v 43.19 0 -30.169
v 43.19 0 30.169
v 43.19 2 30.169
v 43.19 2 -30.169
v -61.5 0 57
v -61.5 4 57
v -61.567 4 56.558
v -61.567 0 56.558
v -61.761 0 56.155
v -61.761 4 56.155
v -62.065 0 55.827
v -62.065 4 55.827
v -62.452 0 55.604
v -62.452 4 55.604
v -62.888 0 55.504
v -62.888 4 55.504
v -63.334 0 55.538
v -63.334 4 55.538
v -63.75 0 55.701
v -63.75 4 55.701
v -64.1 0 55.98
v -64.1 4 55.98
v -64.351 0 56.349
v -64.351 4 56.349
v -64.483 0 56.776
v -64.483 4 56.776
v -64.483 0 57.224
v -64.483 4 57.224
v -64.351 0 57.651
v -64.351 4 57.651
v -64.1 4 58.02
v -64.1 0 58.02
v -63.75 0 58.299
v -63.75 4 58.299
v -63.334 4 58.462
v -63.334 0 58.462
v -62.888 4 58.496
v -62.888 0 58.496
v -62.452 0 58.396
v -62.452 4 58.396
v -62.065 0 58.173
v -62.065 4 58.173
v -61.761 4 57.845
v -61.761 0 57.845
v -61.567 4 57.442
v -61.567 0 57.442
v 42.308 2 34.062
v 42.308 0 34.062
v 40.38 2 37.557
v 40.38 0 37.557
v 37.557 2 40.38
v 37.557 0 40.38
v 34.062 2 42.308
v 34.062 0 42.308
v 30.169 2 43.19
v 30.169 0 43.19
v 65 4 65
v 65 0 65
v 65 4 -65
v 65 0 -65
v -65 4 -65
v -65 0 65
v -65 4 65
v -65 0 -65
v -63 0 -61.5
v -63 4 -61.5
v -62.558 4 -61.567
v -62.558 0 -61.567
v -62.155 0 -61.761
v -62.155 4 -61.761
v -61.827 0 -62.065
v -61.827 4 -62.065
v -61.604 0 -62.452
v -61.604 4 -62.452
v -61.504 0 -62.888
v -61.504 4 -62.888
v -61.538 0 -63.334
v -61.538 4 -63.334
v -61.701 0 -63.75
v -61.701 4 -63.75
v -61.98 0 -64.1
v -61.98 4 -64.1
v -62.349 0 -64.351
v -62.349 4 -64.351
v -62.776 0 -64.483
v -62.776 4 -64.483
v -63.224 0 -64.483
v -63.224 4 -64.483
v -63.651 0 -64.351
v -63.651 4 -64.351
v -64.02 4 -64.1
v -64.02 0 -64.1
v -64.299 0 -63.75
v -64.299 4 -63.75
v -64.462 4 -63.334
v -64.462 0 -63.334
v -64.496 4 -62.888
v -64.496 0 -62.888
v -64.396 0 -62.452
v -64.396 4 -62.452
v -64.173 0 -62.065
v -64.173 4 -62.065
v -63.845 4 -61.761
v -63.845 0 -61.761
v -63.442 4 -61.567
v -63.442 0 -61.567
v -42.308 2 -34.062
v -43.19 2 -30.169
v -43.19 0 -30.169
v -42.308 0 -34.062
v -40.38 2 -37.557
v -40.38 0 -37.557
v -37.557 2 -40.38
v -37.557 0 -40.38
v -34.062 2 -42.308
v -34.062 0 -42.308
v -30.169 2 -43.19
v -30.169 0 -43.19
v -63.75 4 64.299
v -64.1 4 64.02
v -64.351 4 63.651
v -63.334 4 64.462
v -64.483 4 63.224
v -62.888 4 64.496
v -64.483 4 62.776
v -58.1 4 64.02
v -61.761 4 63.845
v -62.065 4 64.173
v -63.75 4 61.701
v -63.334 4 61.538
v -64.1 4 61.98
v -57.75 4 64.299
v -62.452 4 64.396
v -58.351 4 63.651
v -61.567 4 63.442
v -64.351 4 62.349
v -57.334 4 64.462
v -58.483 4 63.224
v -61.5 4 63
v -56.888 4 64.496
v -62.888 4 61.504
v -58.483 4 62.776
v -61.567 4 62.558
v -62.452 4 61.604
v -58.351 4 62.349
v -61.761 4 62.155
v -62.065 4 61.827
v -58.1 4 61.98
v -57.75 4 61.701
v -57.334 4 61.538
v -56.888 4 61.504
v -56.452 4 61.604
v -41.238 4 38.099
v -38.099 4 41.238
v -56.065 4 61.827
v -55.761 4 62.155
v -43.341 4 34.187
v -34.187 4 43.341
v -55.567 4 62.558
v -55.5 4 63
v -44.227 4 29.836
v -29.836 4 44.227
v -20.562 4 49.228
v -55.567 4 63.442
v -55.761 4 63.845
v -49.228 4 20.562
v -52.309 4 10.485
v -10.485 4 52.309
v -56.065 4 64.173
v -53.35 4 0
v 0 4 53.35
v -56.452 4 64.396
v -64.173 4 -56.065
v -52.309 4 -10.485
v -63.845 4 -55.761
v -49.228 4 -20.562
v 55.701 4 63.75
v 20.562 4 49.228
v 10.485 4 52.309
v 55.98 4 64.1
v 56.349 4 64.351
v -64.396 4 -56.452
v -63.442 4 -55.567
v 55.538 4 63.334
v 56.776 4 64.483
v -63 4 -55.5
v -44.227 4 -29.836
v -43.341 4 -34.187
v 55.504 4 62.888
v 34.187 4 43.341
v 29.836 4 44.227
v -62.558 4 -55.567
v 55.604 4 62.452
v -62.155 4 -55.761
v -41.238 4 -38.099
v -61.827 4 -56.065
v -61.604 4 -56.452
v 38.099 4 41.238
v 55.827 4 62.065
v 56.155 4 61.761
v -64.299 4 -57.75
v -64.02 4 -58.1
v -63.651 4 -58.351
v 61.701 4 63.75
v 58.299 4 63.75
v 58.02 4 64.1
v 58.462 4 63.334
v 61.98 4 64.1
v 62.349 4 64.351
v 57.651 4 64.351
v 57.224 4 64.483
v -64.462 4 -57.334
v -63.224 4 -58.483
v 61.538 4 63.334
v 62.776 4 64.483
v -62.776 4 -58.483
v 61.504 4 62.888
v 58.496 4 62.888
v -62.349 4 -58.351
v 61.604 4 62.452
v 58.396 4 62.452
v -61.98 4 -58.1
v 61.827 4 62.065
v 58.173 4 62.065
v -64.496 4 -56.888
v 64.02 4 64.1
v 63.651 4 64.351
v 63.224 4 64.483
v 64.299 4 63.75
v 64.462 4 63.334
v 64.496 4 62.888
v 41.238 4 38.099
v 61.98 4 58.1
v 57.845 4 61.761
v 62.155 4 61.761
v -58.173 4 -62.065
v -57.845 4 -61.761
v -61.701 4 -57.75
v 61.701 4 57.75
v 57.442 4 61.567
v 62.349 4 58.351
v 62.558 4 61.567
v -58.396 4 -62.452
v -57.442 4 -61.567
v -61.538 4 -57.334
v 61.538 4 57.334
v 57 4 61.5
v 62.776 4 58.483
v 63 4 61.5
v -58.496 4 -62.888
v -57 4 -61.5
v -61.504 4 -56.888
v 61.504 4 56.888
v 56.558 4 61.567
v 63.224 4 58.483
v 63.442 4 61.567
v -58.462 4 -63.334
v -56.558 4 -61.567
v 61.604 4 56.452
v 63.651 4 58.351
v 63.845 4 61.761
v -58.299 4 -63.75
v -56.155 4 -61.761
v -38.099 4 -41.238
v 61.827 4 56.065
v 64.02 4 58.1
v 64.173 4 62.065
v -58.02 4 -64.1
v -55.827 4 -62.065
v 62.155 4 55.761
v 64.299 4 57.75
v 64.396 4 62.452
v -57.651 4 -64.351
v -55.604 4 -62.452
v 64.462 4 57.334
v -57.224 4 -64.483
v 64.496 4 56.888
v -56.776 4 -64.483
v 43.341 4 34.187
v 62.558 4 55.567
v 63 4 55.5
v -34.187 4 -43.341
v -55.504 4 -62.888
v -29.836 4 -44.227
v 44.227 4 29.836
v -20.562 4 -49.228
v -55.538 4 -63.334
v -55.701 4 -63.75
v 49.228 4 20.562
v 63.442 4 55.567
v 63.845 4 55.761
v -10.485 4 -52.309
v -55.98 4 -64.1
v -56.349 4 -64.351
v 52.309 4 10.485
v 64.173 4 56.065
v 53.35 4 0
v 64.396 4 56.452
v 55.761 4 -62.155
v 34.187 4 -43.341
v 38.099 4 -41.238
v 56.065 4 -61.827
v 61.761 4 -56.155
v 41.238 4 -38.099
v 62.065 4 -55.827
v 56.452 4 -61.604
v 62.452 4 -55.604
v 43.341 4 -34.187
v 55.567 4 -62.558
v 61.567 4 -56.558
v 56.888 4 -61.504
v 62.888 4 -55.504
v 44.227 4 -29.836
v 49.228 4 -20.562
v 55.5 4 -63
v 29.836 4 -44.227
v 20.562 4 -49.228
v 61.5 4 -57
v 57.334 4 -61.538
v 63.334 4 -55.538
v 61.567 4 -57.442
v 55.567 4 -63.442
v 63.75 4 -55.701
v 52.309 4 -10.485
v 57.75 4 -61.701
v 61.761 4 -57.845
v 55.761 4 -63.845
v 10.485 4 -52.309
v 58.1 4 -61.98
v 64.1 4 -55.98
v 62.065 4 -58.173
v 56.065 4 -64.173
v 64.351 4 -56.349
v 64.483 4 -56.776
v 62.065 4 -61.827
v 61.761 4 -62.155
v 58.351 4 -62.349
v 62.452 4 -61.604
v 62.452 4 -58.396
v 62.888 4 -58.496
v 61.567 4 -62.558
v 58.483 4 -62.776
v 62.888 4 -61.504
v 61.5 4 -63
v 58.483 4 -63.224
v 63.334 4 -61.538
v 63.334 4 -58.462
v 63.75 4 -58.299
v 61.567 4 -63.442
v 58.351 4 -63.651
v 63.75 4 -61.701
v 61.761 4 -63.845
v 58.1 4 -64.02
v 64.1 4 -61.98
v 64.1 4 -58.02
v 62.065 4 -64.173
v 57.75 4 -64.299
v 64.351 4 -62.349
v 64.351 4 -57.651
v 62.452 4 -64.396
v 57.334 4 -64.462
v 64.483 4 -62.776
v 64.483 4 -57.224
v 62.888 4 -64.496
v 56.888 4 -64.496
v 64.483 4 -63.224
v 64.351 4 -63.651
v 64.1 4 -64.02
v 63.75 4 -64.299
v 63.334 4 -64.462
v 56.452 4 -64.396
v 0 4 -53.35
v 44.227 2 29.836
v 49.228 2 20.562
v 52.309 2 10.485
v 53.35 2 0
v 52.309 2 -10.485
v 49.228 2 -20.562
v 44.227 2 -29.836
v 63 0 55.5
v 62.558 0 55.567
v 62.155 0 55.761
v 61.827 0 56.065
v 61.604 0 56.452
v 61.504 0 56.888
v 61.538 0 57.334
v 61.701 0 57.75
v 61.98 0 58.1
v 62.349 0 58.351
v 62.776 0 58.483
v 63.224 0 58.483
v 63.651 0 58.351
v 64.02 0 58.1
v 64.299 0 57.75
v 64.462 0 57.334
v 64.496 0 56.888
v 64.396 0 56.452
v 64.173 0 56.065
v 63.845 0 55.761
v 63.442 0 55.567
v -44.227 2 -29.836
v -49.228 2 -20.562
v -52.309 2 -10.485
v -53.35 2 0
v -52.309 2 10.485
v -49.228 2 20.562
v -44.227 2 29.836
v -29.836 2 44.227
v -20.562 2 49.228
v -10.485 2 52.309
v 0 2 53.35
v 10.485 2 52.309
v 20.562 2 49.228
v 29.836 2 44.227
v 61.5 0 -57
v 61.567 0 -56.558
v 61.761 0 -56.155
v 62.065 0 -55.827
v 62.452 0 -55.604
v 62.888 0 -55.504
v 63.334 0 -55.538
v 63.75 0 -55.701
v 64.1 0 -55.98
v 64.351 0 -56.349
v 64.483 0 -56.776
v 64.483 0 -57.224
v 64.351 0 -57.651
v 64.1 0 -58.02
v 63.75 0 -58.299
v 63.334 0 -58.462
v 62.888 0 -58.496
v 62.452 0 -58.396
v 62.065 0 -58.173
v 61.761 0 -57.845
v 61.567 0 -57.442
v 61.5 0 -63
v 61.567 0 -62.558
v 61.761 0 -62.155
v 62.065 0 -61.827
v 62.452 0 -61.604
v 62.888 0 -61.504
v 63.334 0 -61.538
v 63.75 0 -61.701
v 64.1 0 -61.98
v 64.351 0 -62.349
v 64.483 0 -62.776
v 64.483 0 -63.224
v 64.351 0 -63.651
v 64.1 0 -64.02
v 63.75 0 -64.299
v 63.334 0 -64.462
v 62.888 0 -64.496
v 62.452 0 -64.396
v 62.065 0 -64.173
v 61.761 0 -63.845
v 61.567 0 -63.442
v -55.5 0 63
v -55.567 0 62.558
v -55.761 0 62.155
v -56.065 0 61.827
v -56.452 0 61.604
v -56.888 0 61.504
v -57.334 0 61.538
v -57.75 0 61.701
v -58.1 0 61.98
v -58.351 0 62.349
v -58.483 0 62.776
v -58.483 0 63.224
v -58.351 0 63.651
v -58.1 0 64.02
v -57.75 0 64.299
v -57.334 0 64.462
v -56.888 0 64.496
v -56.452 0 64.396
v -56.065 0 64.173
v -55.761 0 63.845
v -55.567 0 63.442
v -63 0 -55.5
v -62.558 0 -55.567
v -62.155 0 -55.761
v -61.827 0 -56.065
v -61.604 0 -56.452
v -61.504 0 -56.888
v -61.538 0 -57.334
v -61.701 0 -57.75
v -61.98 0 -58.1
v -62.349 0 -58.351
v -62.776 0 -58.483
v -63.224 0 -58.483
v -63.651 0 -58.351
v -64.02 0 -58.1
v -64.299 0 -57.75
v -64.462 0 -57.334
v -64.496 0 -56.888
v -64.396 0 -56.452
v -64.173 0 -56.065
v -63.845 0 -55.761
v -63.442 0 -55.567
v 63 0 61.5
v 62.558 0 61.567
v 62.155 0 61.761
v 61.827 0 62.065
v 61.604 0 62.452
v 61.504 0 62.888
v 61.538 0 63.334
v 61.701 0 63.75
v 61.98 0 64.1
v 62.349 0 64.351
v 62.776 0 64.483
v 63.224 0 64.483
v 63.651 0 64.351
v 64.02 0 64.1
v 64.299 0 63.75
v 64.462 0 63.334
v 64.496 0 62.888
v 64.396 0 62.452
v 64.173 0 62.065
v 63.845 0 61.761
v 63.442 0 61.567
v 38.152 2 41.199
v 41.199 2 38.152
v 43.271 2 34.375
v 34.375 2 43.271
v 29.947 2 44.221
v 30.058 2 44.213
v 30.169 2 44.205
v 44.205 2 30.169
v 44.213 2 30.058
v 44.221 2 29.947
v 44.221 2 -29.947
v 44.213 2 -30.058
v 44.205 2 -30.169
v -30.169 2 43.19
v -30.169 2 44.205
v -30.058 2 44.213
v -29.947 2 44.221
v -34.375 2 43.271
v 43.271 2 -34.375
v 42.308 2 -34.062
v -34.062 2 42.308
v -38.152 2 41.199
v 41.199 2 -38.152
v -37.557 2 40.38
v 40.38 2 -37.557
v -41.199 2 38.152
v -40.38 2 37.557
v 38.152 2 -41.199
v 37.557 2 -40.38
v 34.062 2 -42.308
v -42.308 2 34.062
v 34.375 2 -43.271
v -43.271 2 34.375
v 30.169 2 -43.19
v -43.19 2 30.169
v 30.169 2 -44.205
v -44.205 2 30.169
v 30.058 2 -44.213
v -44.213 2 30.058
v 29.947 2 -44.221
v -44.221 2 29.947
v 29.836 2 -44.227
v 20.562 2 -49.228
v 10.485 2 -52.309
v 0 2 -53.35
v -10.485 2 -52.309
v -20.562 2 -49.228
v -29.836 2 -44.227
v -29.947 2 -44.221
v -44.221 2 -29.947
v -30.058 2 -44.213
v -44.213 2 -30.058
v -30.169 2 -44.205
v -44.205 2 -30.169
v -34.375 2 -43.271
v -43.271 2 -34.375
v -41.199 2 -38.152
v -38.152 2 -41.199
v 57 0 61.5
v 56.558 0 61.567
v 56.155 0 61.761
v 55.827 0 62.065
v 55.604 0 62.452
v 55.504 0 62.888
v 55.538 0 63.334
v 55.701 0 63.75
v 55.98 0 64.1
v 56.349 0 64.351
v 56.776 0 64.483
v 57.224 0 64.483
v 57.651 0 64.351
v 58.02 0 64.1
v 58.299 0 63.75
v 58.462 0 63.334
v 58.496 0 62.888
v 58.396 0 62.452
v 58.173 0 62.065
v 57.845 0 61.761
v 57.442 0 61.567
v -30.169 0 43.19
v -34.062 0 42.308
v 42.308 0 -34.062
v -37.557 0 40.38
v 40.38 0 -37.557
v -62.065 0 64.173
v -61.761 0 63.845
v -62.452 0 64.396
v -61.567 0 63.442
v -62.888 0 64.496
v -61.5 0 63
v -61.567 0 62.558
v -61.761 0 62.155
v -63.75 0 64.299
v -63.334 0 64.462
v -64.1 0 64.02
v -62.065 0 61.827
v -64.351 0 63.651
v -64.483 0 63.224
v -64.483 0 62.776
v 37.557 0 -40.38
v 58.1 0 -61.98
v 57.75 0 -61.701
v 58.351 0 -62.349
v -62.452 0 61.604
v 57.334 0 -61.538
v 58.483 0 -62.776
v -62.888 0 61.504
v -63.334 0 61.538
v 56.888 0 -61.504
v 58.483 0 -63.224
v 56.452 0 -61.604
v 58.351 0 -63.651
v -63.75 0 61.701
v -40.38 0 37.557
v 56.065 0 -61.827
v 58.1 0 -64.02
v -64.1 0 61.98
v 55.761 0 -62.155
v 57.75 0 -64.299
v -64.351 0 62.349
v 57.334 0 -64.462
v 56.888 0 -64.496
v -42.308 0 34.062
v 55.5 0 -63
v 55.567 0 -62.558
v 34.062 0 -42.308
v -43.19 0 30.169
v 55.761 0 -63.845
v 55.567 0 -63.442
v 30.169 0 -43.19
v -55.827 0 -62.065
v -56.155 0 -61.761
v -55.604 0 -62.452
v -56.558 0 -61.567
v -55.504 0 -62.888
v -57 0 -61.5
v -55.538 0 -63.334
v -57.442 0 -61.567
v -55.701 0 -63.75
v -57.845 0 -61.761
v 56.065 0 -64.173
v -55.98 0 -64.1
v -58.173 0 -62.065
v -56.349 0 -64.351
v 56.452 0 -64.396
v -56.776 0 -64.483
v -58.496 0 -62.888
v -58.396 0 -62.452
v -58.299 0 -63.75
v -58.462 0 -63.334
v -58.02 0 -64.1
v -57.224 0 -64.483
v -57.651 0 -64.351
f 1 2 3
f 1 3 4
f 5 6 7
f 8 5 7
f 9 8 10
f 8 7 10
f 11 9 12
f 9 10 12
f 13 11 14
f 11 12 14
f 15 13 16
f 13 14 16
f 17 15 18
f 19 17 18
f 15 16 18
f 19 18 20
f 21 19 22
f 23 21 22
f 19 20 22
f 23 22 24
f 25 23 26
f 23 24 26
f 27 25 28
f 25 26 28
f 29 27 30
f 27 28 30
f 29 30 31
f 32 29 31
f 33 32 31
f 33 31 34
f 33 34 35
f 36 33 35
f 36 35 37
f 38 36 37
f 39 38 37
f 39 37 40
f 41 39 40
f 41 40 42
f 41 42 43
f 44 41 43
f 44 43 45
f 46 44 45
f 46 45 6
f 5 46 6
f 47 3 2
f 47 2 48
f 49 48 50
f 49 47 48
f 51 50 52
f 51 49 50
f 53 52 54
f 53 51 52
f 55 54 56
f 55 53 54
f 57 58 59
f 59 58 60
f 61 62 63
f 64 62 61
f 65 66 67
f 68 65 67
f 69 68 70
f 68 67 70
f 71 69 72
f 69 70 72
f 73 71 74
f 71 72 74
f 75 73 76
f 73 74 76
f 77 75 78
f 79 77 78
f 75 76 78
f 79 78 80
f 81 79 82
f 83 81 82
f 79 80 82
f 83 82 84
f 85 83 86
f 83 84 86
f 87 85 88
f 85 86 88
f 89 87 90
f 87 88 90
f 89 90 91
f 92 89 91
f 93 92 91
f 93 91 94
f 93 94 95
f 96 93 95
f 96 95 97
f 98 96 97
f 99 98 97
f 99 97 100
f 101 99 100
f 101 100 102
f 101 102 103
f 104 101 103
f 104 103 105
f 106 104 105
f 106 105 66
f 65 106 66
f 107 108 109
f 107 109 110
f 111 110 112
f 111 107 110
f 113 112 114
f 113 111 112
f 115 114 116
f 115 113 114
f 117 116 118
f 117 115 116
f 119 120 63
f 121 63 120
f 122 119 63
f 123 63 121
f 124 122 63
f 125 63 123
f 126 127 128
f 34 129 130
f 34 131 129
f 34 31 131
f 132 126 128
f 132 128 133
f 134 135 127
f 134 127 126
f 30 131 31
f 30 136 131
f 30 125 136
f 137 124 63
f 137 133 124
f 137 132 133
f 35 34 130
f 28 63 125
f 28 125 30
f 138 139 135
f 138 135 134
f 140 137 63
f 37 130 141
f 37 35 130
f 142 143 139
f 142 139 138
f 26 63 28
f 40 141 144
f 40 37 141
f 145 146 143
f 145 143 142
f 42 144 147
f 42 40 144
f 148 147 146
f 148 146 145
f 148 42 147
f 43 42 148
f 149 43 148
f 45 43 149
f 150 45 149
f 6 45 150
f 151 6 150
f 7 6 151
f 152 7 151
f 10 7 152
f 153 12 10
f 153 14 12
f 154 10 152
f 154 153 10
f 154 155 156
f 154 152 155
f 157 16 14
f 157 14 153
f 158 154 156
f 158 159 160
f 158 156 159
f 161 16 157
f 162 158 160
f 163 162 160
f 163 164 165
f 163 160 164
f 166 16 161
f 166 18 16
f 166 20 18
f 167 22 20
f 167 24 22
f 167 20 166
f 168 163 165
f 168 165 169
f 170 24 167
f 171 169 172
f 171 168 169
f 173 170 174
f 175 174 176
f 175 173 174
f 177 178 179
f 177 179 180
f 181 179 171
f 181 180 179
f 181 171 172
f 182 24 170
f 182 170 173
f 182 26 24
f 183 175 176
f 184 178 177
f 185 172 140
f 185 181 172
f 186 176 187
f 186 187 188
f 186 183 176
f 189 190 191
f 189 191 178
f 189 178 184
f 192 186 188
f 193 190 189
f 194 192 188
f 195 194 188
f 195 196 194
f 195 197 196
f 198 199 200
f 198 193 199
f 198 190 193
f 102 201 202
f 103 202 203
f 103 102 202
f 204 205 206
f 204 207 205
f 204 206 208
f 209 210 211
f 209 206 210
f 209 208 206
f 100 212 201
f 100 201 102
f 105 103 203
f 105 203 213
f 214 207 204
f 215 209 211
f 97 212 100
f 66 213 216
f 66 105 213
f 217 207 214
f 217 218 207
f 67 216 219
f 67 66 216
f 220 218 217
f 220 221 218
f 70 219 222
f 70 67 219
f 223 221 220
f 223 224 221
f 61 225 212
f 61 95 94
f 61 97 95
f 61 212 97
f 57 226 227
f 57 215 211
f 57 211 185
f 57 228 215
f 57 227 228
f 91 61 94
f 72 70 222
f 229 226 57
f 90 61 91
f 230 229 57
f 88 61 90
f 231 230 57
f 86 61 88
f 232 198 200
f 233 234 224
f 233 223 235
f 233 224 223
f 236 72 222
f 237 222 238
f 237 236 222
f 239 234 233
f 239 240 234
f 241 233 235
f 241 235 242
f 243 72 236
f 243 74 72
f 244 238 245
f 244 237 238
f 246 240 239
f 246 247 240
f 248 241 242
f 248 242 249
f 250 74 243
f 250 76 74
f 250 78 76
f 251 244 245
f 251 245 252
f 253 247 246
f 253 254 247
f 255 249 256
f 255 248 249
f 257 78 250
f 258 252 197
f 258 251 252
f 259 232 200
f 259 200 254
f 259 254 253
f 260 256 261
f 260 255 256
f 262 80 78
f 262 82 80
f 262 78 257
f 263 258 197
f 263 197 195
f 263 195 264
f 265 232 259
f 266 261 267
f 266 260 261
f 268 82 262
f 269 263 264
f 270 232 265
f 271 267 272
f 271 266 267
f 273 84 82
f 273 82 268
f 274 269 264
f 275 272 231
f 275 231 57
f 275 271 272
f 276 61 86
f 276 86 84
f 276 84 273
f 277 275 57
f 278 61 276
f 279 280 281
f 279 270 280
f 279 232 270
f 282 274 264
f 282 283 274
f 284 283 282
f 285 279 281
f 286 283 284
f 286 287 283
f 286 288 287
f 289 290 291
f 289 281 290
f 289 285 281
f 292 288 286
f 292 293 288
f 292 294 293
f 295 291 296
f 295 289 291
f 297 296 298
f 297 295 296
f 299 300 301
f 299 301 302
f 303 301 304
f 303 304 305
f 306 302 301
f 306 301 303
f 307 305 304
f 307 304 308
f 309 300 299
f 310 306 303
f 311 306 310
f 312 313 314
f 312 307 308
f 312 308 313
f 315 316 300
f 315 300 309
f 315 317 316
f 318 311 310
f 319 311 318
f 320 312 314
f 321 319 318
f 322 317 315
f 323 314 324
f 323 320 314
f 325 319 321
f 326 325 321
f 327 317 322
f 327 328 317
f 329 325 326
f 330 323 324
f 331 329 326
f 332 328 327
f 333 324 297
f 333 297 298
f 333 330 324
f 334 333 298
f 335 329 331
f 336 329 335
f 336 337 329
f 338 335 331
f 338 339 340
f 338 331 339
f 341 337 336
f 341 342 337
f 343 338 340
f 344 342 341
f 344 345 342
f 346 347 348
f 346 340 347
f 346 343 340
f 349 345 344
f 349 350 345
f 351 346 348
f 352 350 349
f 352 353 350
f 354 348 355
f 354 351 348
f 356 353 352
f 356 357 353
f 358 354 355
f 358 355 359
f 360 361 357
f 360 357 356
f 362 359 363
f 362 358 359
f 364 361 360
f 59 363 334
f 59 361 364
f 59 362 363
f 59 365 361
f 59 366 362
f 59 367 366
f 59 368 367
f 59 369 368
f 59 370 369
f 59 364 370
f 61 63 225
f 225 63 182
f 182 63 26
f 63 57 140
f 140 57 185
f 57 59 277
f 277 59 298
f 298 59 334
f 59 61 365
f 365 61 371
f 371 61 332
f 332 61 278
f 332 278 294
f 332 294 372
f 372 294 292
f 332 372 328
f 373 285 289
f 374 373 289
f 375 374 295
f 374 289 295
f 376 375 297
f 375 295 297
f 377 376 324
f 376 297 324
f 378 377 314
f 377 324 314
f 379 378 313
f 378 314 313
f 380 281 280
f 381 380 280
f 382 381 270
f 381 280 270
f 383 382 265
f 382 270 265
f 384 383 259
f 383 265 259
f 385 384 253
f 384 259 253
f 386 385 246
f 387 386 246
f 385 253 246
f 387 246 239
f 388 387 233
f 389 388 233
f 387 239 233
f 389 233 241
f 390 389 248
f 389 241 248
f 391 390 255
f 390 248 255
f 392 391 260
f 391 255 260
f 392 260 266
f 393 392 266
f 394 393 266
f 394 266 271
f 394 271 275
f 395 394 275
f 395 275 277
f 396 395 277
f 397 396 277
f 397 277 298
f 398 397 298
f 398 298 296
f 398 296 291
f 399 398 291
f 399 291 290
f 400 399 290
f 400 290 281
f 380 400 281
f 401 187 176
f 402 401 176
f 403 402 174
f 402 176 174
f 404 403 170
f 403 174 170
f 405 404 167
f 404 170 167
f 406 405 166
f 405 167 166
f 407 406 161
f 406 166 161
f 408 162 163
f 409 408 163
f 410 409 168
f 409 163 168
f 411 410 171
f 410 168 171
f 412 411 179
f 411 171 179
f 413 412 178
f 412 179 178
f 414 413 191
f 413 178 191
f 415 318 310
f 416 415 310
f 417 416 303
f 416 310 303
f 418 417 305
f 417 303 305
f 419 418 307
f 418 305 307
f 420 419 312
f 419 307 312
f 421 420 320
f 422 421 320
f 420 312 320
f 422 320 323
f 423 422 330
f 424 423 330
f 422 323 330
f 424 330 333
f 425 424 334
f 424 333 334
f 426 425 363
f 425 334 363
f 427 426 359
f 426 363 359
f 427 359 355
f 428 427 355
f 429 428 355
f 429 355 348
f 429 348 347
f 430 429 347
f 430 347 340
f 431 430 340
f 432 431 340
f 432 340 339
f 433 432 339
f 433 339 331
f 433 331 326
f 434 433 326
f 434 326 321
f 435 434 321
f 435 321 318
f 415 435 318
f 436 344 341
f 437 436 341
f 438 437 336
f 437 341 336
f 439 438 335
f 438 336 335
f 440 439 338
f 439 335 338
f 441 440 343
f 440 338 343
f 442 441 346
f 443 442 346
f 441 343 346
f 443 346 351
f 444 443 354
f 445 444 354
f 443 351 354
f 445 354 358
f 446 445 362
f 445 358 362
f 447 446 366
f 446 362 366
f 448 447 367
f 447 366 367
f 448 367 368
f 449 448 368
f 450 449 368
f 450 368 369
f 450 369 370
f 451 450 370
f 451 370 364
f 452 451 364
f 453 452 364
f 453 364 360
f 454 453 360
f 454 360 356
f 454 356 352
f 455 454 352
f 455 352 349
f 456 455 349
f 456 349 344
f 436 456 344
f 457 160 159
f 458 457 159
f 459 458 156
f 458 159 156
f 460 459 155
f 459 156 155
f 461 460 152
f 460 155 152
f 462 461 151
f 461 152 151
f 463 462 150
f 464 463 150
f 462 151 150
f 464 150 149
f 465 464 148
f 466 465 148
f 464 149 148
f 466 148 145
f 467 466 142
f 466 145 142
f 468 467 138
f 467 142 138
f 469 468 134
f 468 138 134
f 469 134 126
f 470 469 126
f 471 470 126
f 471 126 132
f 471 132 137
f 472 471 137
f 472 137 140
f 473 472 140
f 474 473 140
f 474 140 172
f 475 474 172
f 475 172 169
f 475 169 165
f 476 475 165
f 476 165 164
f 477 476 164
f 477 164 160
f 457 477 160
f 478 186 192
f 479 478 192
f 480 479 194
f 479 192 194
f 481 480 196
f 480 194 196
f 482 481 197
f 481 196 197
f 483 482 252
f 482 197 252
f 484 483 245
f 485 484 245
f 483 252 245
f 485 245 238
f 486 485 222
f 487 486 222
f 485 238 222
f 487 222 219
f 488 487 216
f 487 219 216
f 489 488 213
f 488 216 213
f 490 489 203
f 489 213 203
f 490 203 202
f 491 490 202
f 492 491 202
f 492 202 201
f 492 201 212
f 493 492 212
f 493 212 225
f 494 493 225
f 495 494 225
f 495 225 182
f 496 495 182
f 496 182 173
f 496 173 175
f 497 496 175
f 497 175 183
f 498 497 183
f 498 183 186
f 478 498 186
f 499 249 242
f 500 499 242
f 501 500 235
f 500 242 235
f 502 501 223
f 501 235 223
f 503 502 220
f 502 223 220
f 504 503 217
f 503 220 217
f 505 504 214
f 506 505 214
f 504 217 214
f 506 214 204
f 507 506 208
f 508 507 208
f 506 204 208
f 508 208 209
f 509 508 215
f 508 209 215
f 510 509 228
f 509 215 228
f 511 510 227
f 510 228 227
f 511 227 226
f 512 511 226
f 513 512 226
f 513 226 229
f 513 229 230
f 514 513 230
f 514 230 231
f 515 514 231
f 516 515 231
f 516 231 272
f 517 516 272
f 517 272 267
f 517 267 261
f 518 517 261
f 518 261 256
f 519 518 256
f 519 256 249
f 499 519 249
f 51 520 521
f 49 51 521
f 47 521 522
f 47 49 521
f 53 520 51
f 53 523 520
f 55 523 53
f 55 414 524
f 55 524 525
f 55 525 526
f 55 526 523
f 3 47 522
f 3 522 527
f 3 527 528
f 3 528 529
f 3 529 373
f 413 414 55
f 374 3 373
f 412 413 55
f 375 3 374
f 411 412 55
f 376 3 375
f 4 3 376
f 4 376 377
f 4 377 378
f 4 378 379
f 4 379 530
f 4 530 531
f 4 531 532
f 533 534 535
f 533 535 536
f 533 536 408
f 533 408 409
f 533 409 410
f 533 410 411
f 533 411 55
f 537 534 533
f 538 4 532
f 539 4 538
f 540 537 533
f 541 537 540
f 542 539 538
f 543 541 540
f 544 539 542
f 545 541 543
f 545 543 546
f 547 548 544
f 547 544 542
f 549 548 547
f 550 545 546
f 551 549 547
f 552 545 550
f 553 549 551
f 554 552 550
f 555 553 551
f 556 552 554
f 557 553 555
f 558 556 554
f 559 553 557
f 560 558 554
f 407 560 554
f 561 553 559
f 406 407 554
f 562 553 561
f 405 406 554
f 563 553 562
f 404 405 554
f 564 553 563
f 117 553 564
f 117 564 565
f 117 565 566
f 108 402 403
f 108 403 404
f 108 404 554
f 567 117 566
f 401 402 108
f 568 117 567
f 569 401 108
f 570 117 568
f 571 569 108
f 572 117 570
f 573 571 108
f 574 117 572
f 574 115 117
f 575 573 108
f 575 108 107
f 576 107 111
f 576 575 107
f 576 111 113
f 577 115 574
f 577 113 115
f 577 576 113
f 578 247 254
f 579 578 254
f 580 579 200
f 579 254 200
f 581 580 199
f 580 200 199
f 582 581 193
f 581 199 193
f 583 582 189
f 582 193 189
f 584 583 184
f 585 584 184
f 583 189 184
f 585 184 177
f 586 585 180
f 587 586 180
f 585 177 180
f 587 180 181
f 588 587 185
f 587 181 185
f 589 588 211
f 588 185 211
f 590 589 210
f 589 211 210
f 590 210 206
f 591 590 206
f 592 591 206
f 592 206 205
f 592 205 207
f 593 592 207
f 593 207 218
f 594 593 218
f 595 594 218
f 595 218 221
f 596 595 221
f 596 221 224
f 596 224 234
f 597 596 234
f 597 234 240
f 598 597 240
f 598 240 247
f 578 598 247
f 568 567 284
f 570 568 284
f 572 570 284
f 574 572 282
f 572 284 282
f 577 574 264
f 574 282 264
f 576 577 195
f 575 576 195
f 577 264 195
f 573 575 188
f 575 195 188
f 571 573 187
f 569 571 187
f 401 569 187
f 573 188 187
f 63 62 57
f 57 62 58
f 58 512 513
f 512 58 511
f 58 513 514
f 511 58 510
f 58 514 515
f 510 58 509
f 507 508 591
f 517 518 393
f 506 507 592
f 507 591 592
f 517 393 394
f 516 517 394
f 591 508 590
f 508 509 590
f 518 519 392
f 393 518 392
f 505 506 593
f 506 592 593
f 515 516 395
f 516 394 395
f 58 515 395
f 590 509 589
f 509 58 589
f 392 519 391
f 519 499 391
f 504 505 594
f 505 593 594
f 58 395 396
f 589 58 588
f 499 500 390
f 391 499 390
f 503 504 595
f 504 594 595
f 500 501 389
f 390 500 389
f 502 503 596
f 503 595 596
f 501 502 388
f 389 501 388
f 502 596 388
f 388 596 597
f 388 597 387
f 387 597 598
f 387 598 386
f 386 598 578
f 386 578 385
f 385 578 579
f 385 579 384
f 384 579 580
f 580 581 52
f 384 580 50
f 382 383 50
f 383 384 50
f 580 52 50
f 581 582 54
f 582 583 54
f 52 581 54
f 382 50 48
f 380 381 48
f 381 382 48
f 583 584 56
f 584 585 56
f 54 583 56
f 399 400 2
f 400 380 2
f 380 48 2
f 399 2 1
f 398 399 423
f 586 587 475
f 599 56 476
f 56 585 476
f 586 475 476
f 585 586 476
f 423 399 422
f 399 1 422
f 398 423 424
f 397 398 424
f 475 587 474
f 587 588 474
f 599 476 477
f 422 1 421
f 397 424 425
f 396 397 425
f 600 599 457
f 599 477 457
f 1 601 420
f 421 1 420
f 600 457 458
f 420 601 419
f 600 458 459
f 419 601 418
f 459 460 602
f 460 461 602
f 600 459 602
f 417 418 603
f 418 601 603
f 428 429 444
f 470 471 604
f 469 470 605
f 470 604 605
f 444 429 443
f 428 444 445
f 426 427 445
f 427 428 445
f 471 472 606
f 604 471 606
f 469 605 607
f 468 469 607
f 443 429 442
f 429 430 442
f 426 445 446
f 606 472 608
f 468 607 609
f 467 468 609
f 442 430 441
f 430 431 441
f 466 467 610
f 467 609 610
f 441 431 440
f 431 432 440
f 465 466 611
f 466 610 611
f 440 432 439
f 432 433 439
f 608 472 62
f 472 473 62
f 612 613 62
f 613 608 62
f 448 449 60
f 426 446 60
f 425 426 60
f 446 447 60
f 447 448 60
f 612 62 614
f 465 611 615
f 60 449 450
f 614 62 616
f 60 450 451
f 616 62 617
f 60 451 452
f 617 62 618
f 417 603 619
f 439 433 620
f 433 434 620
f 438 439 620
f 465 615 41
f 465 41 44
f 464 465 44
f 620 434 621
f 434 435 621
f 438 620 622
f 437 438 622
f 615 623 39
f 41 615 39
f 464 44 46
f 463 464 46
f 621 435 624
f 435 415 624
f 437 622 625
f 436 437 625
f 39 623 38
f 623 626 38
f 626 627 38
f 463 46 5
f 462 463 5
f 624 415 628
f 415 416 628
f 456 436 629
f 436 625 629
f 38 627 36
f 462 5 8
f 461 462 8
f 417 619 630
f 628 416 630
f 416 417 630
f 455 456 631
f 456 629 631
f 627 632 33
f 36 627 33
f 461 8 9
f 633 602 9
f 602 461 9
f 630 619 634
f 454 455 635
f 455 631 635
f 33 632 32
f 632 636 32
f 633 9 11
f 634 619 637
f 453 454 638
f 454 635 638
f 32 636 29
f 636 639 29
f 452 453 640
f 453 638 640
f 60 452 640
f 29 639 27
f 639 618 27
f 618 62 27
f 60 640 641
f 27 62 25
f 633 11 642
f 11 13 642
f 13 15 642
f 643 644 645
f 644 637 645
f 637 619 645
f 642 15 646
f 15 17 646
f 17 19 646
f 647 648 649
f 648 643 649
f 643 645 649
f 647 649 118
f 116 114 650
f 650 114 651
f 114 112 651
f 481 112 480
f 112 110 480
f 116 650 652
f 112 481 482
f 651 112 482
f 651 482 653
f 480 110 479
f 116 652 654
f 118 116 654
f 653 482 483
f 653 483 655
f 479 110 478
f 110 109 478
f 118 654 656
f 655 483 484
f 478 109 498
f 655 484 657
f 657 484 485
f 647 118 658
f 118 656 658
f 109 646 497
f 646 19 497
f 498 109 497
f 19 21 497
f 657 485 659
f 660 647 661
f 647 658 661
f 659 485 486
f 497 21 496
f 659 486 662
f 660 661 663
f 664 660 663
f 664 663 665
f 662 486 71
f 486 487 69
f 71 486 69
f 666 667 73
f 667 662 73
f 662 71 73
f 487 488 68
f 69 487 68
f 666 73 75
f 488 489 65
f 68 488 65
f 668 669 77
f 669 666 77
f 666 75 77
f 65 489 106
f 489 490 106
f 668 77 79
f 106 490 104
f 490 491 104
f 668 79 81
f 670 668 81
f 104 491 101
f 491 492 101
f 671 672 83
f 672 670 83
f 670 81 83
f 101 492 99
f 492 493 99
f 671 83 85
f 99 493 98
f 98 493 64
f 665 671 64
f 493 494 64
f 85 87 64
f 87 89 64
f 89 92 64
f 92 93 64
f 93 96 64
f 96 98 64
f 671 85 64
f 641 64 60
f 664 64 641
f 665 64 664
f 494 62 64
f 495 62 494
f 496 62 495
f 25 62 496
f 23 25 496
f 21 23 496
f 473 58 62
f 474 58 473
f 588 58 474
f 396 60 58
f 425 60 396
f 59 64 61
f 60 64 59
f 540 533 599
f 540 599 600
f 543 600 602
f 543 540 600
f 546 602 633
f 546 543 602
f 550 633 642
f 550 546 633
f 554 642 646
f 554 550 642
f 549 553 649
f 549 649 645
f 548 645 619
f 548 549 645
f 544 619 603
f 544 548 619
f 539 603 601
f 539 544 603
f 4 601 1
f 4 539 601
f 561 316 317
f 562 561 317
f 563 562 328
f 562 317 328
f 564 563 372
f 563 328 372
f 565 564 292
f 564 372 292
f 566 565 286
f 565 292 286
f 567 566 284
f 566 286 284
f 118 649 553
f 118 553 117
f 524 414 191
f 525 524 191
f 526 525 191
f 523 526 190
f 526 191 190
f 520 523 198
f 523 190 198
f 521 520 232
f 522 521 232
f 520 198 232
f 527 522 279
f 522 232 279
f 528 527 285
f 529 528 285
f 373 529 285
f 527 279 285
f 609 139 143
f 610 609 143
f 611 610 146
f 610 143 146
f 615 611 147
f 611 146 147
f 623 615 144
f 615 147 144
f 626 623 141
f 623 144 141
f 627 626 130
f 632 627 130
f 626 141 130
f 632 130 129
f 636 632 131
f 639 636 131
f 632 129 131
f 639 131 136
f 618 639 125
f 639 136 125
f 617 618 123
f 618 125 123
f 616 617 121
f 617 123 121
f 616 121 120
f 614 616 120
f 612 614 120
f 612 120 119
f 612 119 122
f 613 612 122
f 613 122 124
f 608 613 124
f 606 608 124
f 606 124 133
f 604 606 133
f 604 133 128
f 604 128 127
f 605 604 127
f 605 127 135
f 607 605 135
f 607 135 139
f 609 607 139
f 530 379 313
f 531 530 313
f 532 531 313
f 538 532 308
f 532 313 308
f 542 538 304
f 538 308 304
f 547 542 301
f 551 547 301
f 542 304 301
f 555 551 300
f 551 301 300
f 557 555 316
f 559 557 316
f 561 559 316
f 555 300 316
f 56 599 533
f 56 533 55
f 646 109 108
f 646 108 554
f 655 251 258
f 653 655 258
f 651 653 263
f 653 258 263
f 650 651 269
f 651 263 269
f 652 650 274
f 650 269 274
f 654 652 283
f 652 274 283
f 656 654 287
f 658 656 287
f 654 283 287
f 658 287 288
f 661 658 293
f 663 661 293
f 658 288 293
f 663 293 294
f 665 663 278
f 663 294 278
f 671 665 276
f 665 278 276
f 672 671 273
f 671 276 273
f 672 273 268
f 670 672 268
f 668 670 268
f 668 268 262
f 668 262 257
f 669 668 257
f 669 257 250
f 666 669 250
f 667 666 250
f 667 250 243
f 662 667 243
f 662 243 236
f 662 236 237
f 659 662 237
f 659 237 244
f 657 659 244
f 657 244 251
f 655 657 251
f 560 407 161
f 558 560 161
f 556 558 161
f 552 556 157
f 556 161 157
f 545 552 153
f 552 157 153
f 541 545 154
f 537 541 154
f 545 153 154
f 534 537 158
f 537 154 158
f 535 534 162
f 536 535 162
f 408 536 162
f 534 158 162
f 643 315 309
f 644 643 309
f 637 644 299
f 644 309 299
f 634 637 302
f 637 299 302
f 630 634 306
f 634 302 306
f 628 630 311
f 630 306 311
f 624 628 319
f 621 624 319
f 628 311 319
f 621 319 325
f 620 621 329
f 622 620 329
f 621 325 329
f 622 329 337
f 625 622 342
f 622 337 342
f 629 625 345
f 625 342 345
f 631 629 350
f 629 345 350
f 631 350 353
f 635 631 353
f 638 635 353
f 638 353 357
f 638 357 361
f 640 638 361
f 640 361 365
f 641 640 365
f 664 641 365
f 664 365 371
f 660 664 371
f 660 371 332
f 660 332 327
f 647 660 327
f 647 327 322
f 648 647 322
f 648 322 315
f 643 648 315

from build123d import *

# Parameters (mm, degrees)
SKETCH1_W           = 130
SKETCH1_H           = 130
BOSS_EXTRUDE1_DEPTH = 4
CUT_EXTRUDE1_DEPTH  = 4
SKETCH6_W           = 60.337998114
SKETCH6_H           = 11.352835906
BOSS_EXTRUDE2_DEPTH = 2
CIRPATTERN1_COUNT   = 4
BOSS_EXTRUDE3_START = -2
BOSS_EXTRUDE3_DEPTH = 2
CIRPATTERN2_COUNT   = 4
SKETCH10_R          = 1.5
CUT_EXTRUDE2_DEPTH  = 93.010868923
CIRPATTERN3_COUNT   = 4


with BuildPart() as part:
    # Sketch1 → Boss-Extrude1 (new body)
    with BuildSketch(Plane(origin=(0, 0, 0), x_dir=(1, 0, 0), z_dir=(0, 1, 0))):
        Rectangle(SKETCH1_W, SKETCH1_H)
    extrude(amount=BOSS_EXTRUDE1_DEPTH)

    # Sketch5 → Cut-Extrude1 (cut)
    with BuildSketch(Plane(origin=(0, 4, 0), x_dir=(1, 0, 0), z_dir=(0, 1, 0))):
        with BuildLine():
            ThreePointArc((29.836037364, 44.227066084), (0, 53.35), (-29.836037364, 44.227066084))
            ThreePointArc((-29.836037364, 44.227066084), (-39.783378413, 39.783378413), (-44.227066084, 29.836037364))
            ThreePointArc((-44.227066084, 29.836037364), (-53.35, 0), (-44.227066084, -29.836037364))
            ThreePointArc((-44.227066084, -29.836037364), (-39.783378413, -39.783378413), (-29.836037364, -44.227066084))
            ThreePointArc((-29.836037364, -44.227066084), (0, -53.35), (29.836037364, -44.227066084))
            ThreePointArc((29.836037364, -44.227066084), (39.783378413, -39.783378413), (44.227066084, -29.836037364))
            ThreePointArc((44.227066084, -29.836037364), (53.35, 0), (44.227066084, 29.836037364))
            ThreePointArc((44.227066084, 29.836037364), (39.783378413, 39.783378413), (29.836037364, 44.227066084))
        make_face()
    extrude(amount=-CUT_EXTRUDE1_DEPTH, mode=Mode.SUBTRACT)

    # Sketch6 → Boss-Extrude2 (add)
    with BuildSketch(Plane.XZ):
        with Locations((0, 48.86626436)):
            Rectangle(SKETCH6_W, SKETCH6_H)
    boss_extrude2 = extrude(amount=-BOSS_EXTRUDE2_DEPTH)

    # CirPattern1: Boss-Extrude2 ×4 about axis
    cirpattern1_axis = Axis((0, 0, 0), (0, 1, 0))
    for i in range(1, CIRPATTERN1_COUNT):
        add(boss_extrude2.rotate(cirpattern1_axis, i * 360 / CIRPATTERN1_COUNT))

    # Sketch9 → Boss-Extrude3 (add)
    with BuildSketch(Plane.XZ.offset(BOSS_EXTRUDE3_START)):
        with BuildLine():
            Line((-30.168999057, 44.20512878), (-30.168999057, 43.189846407))
            ThreePointArc((-30.168999057, 43.189846407), (-39.067728141, 39.067728141), (-43.189846407, 30.168999057))
            Line((-43.189846407, 30.168999057), (-44.20512878, 30.168999057))
            ThreePointArc((-44.20512878, 30.168999057), (-39.783378413, 39.783378413), (-30.168999057, 44.20512878))
        make_face()
    boss_extrude3 = extrude(amount=BOSS_EXTRUDE3_DEPTH)

    # CirPattern2: Boss-Extrude3 ×4 about axis
    cirpattern2_axis = Axis((0, 0, 0), (0, 1, 0))
    for i in range(1, CIRPATTERN2_COUNT):
        add(boss_extrude3.rotate(cirpattern2_axis, i * 360 / CIRPATTERN2_COUNT))

    # Sketch10 → Cut-Extrude2 (cut, through all)
    with BuildSketch(Plane(origin=(0, 4, 0), x_dir=(1, 0, 0), z_dir=(0, 1, 0))):
        with Locations(Location((-63, 63, 0), (0, 0, 270))):
            Circle(SKETCH10_R)
        with Locations(Location((-57, 63, 0), (0, 0, 270))):
            Circle(SKETCH10_R)
        with Locations(Location((-63, 57, 0), (0, 0, 270))):
            Circle(SKETCH10_R)
    cut_extrude2 = extrude(amount=-CUT_EXTRUDE2_DEPTH, mode=Mode.SUBTRACT)

    # CirPattern3: Cut-Extrude2 ×4 about axis
    cirpattern3_axis = Axis((0, 0, 0), (0, 1, 0))
    for i in range(1, CIRPATTERN3_COUNT):
        add(cut_extrude2.rotate(cirpattern3_axis, i * 360 / CIRPATTERN3_COUNT), mode=Mode.SUBTRACT)


solid = part.part
